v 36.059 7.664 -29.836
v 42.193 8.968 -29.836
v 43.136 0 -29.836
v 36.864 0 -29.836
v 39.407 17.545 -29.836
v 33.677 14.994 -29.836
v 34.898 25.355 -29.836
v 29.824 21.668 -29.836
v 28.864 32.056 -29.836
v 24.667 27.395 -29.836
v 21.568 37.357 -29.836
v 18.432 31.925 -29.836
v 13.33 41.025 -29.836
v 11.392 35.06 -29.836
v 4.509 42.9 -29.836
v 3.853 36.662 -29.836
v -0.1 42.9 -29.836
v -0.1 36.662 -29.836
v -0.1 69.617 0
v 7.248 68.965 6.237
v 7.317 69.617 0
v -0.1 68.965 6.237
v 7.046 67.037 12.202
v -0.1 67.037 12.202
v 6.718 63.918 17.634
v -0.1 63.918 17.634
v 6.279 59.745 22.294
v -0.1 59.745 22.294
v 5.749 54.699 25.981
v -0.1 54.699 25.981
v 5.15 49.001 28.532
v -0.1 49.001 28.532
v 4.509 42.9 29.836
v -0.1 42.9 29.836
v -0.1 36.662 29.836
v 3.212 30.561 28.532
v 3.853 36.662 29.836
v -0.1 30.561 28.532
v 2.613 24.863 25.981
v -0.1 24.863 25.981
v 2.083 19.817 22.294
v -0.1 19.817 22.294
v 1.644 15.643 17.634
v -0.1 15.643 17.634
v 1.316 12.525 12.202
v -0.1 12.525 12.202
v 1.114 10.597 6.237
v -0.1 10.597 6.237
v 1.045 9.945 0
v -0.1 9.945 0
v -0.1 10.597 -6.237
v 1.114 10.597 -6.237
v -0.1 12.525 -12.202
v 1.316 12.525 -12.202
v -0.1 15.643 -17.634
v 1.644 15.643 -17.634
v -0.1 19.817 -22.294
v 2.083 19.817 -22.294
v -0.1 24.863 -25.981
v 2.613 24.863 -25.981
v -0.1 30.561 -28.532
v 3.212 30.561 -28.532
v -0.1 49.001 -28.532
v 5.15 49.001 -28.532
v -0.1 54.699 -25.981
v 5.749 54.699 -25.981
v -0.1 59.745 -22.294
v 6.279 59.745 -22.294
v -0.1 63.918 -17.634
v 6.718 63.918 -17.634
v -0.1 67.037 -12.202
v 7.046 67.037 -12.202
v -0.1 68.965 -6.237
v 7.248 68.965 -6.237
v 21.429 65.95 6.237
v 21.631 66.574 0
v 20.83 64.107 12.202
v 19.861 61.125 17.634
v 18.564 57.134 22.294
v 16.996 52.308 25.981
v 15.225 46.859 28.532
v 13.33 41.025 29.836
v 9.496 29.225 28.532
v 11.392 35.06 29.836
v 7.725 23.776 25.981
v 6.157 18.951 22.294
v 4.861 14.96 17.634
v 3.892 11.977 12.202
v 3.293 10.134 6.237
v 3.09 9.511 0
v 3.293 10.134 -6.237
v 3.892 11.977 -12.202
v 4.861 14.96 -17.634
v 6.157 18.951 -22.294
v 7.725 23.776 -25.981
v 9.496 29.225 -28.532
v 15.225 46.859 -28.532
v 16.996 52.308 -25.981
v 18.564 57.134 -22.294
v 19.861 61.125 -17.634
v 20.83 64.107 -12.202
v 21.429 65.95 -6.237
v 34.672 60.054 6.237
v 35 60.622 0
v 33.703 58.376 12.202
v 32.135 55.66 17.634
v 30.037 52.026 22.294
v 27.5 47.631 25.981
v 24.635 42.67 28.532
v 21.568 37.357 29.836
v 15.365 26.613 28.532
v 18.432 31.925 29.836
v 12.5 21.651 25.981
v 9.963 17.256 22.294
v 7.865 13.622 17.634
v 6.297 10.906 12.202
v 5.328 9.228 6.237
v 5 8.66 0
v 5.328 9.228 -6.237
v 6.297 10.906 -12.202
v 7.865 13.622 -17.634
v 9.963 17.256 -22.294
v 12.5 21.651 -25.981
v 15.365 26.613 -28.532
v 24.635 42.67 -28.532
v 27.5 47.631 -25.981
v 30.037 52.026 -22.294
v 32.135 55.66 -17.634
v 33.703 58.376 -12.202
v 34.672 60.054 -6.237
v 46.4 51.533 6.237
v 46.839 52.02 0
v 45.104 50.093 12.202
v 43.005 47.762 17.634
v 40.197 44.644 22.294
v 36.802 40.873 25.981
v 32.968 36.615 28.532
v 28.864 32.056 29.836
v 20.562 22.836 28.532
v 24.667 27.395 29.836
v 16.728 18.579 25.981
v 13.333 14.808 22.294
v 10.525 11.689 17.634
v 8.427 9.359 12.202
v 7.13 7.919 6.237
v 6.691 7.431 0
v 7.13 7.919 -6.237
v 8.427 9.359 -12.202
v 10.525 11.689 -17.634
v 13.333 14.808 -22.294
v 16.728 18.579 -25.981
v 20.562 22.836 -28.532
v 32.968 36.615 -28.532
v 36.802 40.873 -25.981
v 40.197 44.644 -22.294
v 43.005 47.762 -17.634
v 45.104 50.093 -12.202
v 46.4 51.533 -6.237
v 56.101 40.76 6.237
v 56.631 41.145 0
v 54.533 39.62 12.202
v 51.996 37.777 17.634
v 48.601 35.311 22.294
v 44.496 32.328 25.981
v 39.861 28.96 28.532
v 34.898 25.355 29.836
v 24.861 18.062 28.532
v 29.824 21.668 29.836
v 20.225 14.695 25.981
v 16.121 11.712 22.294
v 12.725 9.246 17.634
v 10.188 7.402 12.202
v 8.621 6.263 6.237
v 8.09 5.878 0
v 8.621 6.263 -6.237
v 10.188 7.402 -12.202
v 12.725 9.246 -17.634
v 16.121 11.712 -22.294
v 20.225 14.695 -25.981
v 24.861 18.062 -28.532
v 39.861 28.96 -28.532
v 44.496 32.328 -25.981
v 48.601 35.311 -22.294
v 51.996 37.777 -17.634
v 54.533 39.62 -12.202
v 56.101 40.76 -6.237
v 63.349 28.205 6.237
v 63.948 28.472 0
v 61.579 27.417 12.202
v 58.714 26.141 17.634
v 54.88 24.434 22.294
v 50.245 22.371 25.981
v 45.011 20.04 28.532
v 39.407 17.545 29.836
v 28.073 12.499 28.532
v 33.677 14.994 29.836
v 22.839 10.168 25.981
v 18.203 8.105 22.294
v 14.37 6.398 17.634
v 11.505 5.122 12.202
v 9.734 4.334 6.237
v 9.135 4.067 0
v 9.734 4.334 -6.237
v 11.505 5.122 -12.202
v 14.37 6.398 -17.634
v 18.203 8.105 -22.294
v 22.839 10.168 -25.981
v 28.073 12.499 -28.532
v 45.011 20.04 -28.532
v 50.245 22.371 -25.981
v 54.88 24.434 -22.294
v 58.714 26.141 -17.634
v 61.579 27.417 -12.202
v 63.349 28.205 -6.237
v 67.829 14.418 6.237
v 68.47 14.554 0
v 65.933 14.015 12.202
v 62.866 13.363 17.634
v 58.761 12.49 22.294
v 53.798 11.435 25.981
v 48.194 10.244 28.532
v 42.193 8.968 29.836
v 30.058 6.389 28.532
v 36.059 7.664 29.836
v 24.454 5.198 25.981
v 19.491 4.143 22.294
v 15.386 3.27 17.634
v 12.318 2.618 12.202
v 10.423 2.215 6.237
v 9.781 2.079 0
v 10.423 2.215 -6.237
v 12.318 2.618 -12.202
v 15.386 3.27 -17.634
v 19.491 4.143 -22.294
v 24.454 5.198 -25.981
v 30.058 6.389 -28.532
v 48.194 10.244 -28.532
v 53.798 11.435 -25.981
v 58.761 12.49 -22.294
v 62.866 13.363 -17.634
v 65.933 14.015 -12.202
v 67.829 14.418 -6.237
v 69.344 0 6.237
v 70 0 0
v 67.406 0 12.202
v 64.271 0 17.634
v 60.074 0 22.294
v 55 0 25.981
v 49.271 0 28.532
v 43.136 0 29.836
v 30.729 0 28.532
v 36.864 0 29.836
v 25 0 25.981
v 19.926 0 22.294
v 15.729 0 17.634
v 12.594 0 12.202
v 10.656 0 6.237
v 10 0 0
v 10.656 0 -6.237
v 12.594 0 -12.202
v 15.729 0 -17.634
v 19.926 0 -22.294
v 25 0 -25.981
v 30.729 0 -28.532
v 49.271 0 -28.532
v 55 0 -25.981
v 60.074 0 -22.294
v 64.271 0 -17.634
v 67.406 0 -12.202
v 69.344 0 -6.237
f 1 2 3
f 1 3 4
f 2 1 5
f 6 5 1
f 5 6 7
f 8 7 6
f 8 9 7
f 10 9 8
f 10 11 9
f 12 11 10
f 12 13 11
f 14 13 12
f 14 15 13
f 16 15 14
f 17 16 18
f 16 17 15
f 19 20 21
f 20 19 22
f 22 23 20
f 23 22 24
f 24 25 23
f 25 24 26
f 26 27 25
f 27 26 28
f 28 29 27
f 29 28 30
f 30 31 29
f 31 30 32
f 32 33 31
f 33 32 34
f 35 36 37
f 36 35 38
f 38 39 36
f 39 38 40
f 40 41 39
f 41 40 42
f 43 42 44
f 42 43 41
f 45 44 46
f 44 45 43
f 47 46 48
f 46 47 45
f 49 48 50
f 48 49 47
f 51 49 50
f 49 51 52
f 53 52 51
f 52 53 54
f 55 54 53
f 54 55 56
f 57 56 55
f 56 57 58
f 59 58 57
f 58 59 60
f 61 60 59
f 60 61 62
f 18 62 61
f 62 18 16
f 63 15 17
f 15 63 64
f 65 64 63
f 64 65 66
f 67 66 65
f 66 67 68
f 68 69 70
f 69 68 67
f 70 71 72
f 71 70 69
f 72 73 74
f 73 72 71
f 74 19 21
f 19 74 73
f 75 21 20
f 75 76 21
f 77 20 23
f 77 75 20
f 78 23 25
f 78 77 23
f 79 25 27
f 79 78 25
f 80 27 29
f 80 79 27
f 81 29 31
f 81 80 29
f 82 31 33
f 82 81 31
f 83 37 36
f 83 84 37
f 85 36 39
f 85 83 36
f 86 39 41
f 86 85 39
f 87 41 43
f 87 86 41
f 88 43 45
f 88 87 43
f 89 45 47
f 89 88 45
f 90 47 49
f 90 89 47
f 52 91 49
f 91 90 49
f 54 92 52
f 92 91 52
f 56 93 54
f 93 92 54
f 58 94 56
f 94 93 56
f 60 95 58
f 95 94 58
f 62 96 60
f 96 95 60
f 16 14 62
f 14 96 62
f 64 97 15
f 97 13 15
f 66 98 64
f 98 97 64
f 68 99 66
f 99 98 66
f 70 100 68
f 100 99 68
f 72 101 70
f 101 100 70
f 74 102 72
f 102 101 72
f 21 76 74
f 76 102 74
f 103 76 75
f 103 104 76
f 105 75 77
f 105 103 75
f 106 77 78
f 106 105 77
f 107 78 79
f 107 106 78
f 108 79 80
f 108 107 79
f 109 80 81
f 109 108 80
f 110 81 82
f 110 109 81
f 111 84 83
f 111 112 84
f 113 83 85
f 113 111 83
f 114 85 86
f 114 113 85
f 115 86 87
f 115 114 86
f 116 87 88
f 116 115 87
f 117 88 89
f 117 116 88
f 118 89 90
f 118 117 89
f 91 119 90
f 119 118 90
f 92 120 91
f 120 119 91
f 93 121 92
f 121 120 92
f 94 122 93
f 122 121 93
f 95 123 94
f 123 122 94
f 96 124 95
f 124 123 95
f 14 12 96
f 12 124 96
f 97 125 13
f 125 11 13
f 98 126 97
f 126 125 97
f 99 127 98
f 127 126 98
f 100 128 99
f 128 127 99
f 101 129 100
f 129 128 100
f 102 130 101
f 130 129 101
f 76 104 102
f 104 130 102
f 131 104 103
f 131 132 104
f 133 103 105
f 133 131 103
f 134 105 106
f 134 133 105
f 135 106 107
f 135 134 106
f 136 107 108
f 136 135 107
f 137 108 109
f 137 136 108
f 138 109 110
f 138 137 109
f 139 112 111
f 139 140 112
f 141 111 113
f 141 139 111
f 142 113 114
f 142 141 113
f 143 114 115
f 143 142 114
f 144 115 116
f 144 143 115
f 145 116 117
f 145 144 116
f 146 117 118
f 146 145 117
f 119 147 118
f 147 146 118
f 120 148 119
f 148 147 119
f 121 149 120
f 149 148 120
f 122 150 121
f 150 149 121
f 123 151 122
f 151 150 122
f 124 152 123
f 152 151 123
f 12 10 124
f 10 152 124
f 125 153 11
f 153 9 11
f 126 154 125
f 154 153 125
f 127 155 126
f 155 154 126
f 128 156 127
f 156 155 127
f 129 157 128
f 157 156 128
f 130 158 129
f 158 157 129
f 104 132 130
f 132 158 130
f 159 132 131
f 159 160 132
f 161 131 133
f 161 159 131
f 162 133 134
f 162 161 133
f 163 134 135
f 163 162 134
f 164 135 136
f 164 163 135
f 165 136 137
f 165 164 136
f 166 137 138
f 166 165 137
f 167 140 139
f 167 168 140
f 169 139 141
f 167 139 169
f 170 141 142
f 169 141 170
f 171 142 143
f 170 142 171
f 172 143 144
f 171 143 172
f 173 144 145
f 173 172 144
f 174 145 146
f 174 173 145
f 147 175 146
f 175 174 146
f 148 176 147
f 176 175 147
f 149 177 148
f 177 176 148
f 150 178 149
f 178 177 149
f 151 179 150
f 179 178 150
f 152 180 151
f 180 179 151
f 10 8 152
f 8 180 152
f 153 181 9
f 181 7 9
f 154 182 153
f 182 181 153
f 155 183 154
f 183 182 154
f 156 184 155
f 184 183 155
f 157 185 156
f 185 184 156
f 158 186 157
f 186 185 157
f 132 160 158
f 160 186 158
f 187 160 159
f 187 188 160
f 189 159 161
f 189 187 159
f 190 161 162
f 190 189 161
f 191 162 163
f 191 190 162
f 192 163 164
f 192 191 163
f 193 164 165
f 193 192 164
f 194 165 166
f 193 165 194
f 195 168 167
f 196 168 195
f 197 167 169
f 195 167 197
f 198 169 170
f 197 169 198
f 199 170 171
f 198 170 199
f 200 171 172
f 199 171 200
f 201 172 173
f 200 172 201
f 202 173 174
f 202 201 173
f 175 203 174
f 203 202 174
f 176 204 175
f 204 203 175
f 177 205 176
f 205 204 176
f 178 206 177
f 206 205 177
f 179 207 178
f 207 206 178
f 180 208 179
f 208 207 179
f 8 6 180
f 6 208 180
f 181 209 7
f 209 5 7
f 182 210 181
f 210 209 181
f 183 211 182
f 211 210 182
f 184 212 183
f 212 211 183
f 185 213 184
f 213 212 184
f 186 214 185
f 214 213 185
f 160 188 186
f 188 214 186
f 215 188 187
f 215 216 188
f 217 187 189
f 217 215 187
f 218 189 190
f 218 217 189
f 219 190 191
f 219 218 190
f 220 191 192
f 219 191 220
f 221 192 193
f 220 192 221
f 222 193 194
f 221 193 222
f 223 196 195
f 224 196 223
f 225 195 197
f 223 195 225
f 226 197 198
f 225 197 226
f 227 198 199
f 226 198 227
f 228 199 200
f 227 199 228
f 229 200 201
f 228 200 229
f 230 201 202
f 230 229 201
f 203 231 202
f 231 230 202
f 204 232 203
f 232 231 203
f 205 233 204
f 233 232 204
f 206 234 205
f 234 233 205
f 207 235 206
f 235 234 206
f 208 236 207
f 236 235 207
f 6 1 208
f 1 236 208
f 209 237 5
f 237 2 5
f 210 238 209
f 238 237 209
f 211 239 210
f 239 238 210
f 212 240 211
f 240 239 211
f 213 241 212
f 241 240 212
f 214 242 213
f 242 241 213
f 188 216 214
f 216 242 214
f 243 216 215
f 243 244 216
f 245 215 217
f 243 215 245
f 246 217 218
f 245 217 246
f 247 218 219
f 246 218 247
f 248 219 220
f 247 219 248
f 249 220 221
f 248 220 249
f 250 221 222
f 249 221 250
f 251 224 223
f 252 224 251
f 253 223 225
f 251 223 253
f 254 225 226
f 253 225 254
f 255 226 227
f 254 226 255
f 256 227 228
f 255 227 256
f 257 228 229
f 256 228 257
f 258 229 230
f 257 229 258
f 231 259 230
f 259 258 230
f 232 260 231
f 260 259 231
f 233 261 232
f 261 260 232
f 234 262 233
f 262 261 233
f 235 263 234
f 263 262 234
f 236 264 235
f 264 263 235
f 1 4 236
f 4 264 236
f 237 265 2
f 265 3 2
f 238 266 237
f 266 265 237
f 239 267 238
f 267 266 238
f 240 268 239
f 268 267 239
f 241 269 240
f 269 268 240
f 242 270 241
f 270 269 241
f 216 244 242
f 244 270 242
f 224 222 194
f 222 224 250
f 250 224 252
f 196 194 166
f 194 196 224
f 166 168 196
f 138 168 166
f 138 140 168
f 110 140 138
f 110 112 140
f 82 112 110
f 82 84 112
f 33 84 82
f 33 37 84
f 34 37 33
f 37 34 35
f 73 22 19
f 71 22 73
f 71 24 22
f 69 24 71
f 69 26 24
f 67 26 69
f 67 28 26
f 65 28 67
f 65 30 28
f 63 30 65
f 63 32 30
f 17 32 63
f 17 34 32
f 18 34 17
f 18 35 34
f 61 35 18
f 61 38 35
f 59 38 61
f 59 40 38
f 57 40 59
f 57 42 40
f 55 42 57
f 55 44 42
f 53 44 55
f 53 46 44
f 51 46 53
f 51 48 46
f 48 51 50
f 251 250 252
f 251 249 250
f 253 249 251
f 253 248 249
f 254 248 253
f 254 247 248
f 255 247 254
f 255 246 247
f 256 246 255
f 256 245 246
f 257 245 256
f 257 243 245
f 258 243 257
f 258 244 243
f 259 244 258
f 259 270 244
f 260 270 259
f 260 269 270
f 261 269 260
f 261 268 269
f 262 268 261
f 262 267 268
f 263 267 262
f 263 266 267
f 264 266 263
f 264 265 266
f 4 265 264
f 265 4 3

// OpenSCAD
//serial_hull() {
//    cube(10, center=true);
//    translate([20,0,0]) sphere(10);
//    translate([30,0,0]) sphere(5);
//}


module serial_hull() {
    for(i=[0:$children-2]) {
        hull() {
            children(i);
            children(i+1);
        }
    }
}

module wedge(angle, extent=100, height=100, center=true) {
    module wedge_if(sub) {
        rotate([0,0,(angle > sub ? sub : angle)])
            translate([0,0,(center==true ? -height/2 : 0)])
                cube([extent,0.1,height]);
    }
    
    module wedge_wall() {
        for(r=[0:45:angle-1])
        rotate([0,0,r])
            translate([0,0,(center==true ? -height/2 : 0)])
                cube([extent,0.1,height]);
    }
    
    module convex_wedge(a) {
        translate([0,0,(center==true ? -height/2 : 0)])
            serial_hull() {
                for(r=[0:45:a-1])
                    rotate([0,0,r]) cube([extent,0.1,height]);
                rotate([0,0,a]) cube([extent,0.1,height]);
            }
    }
    
    if(angle<=180) {
        intersection() {
            for(i=[0:$children-1]) children(i);
            convex_wedge(angle);
        }
    } else {
        difference() {
            for(i=[0:$children-1]) children(i);
            scale([1,-1,1]) convex_wedge(360-angle);
        }
    }

//    serial_hull() {
//        wedge_if(0);
//        wedge_if(45*1);
//        wedge_if(45*2);
//        wedge_if(45*3);
//        wedge_if(45*4);
//        wedge_if(45*5);
//        wedge_if(45*6);
//        wedge_if(45*7);
//        wedge_if(45*8);
//    }
}

//difference() {
//    rotate_extrude() translate([40,0,0]) circle(r=30);
//    wedge(angle=247);
//}

wedge(angle=90)
    rotate_extrude(convexity=10) translate([40,0,0]) circle(r=30);
